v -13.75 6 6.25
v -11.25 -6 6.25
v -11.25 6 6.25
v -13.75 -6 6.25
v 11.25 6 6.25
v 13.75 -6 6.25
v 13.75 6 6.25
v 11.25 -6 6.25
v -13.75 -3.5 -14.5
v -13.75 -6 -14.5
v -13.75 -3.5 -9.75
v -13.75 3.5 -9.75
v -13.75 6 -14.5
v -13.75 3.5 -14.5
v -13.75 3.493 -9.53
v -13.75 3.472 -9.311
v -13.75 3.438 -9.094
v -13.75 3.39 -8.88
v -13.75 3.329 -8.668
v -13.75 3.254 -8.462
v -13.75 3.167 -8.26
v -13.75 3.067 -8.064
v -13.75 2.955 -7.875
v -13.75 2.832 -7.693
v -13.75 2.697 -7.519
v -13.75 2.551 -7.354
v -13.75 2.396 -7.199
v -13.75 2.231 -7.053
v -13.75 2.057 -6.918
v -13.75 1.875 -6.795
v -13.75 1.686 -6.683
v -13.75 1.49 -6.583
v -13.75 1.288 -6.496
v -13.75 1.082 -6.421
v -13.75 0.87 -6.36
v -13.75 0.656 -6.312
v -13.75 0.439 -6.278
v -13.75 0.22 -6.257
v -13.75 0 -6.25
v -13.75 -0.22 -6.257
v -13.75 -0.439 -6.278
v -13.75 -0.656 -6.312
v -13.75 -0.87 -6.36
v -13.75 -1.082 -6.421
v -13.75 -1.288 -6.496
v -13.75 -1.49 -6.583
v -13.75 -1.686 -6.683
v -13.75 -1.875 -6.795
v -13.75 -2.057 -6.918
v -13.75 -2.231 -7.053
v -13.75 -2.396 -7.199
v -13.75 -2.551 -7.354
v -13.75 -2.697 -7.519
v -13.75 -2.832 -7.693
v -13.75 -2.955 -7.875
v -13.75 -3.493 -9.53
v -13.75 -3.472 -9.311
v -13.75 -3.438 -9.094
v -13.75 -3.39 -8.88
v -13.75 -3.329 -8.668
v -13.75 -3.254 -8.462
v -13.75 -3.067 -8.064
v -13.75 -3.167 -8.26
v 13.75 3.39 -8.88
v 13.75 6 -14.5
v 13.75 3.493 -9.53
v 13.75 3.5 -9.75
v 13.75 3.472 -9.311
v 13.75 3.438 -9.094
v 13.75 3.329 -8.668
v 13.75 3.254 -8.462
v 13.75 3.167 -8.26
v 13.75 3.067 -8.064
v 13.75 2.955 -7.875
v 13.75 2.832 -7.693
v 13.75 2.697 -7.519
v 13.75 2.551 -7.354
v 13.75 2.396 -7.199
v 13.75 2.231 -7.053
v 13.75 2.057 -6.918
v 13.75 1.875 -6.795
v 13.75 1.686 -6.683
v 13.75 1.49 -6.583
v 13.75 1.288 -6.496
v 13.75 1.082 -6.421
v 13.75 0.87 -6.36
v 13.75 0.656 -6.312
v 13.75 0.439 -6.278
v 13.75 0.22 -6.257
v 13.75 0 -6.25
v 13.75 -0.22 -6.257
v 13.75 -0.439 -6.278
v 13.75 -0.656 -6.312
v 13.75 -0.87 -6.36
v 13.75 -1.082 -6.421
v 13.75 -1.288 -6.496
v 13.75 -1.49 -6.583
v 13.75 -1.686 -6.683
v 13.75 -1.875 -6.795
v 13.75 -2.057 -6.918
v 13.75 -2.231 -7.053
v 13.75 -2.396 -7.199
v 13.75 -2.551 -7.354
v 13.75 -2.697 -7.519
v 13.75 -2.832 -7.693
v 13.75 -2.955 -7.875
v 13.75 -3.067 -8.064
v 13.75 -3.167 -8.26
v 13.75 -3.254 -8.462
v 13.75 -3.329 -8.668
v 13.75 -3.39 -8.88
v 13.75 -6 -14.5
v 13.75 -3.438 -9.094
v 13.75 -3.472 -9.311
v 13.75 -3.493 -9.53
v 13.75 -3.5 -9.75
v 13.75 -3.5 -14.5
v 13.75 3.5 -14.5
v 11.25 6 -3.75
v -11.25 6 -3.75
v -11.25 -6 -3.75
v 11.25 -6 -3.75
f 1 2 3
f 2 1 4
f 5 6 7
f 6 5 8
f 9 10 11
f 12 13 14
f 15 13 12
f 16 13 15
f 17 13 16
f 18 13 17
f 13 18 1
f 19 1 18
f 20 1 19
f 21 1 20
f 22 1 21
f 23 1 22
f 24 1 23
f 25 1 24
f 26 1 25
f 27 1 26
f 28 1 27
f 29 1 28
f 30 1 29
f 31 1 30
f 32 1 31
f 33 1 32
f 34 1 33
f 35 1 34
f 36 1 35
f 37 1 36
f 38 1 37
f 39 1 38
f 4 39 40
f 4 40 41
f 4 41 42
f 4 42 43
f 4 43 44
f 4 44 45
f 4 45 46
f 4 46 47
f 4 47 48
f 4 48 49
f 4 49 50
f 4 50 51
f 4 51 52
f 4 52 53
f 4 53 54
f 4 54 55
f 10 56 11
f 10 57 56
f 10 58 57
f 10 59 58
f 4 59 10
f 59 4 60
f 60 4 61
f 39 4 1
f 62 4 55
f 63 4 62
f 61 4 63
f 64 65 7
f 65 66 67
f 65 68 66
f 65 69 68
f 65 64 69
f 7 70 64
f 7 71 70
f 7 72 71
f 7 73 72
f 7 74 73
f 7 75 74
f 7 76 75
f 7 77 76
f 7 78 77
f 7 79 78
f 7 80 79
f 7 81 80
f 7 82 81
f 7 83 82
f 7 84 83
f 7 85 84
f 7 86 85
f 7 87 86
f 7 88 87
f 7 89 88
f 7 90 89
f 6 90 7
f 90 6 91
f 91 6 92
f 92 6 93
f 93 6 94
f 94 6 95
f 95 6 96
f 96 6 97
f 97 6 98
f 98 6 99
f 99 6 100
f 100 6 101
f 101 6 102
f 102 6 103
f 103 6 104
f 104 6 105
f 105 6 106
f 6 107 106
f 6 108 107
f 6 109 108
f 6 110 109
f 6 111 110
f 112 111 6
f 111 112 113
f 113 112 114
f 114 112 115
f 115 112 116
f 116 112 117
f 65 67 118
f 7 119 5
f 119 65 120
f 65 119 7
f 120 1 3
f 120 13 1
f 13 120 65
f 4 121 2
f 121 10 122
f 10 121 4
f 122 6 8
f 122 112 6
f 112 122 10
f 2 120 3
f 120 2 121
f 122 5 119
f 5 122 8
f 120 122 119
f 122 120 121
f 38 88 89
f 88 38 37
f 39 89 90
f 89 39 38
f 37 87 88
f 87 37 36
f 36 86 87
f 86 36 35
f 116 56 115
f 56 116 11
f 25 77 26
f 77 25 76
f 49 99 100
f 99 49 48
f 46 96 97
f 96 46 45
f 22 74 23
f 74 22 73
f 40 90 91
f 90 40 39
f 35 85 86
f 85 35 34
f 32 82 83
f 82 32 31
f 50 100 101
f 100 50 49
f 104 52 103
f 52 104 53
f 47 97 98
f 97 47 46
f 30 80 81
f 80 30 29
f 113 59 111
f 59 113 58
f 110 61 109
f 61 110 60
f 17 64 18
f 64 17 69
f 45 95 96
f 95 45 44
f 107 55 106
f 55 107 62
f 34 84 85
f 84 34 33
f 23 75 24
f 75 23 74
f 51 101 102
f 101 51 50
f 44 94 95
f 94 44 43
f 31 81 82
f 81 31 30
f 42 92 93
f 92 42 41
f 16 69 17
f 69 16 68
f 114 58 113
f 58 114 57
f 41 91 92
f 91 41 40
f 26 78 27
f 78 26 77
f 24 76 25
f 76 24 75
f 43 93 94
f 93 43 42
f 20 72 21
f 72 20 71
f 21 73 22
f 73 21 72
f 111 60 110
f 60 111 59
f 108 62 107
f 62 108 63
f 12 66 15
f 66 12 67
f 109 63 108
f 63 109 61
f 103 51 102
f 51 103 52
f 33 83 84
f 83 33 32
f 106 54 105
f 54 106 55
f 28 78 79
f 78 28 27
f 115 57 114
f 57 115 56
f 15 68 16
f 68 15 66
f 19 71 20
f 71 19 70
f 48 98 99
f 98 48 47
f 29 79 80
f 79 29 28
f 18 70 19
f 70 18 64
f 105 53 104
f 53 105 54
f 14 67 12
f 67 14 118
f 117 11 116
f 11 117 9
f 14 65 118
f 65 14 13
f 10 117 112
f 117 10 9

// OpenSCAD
/*[Parameters]*/

//diameter cable (default: 7)
diameter = 7; //[2:30]

//height table (default: 22.5)
height_table = 22.5;

//width holder (default: 10)
width = 10;

//Thickness holder (default: 2.5)
thickness = 2.5; //[2.5:5]

//Use Lock for cable? (default: No)
lock = "no"; //[no: No, yes: Yes]



/*[hidden]*/
module output(){
	if (lock == "yes"){
		lock();
	}
}



module lock(){
	translate([-(width/2)-(diameter)-(thickness/2),0,0]){
		translate([(diameter/14),(diameter/1.9),0]){
			sphere(r = diameter/12, $fn=32, center=true);
		}
		translate([(diameter/14),-(diameter/1.9),0]){
			sphere(r = diameter/12, $fn=32, center=true);
		}
	}
}


rotate ([0,-90,0])
part1();
module part1(){
	difference(){
		translate([0 ,0,0]){
		cube([width+(thickness),  diameter + (thickness*2) ,height_table+(thickness*2)], center = true); 
	}
		translate([thickness,0,0]){
			cube([width+(thickness), diameter + (thickness*4), height_table], center = true);
		}
	}
	difference(){
		union(){
			difference(){
				translate([(-width/2)-(diameter/2)- (thickness/2),0,0]){
					cube	([diameter+thickness, diameter + (thickness*2) , height_table + (thickness*2)], center = true);
				}
				translate([(-width/2)-(diameter/2)-(thickness/2),0,0]){
					union(){
						#cylinder(h = height_table+(thickness*4), r = diameter/2, $fn=100, center=true);
						translate([-(diameter/2)-1,0, 0]){
							cube([diameter+2, diameter, height_table+(thickness*4)], center = true);
						}
					}
				}
			}

			//lock
			output();
		}
		
	}
}
